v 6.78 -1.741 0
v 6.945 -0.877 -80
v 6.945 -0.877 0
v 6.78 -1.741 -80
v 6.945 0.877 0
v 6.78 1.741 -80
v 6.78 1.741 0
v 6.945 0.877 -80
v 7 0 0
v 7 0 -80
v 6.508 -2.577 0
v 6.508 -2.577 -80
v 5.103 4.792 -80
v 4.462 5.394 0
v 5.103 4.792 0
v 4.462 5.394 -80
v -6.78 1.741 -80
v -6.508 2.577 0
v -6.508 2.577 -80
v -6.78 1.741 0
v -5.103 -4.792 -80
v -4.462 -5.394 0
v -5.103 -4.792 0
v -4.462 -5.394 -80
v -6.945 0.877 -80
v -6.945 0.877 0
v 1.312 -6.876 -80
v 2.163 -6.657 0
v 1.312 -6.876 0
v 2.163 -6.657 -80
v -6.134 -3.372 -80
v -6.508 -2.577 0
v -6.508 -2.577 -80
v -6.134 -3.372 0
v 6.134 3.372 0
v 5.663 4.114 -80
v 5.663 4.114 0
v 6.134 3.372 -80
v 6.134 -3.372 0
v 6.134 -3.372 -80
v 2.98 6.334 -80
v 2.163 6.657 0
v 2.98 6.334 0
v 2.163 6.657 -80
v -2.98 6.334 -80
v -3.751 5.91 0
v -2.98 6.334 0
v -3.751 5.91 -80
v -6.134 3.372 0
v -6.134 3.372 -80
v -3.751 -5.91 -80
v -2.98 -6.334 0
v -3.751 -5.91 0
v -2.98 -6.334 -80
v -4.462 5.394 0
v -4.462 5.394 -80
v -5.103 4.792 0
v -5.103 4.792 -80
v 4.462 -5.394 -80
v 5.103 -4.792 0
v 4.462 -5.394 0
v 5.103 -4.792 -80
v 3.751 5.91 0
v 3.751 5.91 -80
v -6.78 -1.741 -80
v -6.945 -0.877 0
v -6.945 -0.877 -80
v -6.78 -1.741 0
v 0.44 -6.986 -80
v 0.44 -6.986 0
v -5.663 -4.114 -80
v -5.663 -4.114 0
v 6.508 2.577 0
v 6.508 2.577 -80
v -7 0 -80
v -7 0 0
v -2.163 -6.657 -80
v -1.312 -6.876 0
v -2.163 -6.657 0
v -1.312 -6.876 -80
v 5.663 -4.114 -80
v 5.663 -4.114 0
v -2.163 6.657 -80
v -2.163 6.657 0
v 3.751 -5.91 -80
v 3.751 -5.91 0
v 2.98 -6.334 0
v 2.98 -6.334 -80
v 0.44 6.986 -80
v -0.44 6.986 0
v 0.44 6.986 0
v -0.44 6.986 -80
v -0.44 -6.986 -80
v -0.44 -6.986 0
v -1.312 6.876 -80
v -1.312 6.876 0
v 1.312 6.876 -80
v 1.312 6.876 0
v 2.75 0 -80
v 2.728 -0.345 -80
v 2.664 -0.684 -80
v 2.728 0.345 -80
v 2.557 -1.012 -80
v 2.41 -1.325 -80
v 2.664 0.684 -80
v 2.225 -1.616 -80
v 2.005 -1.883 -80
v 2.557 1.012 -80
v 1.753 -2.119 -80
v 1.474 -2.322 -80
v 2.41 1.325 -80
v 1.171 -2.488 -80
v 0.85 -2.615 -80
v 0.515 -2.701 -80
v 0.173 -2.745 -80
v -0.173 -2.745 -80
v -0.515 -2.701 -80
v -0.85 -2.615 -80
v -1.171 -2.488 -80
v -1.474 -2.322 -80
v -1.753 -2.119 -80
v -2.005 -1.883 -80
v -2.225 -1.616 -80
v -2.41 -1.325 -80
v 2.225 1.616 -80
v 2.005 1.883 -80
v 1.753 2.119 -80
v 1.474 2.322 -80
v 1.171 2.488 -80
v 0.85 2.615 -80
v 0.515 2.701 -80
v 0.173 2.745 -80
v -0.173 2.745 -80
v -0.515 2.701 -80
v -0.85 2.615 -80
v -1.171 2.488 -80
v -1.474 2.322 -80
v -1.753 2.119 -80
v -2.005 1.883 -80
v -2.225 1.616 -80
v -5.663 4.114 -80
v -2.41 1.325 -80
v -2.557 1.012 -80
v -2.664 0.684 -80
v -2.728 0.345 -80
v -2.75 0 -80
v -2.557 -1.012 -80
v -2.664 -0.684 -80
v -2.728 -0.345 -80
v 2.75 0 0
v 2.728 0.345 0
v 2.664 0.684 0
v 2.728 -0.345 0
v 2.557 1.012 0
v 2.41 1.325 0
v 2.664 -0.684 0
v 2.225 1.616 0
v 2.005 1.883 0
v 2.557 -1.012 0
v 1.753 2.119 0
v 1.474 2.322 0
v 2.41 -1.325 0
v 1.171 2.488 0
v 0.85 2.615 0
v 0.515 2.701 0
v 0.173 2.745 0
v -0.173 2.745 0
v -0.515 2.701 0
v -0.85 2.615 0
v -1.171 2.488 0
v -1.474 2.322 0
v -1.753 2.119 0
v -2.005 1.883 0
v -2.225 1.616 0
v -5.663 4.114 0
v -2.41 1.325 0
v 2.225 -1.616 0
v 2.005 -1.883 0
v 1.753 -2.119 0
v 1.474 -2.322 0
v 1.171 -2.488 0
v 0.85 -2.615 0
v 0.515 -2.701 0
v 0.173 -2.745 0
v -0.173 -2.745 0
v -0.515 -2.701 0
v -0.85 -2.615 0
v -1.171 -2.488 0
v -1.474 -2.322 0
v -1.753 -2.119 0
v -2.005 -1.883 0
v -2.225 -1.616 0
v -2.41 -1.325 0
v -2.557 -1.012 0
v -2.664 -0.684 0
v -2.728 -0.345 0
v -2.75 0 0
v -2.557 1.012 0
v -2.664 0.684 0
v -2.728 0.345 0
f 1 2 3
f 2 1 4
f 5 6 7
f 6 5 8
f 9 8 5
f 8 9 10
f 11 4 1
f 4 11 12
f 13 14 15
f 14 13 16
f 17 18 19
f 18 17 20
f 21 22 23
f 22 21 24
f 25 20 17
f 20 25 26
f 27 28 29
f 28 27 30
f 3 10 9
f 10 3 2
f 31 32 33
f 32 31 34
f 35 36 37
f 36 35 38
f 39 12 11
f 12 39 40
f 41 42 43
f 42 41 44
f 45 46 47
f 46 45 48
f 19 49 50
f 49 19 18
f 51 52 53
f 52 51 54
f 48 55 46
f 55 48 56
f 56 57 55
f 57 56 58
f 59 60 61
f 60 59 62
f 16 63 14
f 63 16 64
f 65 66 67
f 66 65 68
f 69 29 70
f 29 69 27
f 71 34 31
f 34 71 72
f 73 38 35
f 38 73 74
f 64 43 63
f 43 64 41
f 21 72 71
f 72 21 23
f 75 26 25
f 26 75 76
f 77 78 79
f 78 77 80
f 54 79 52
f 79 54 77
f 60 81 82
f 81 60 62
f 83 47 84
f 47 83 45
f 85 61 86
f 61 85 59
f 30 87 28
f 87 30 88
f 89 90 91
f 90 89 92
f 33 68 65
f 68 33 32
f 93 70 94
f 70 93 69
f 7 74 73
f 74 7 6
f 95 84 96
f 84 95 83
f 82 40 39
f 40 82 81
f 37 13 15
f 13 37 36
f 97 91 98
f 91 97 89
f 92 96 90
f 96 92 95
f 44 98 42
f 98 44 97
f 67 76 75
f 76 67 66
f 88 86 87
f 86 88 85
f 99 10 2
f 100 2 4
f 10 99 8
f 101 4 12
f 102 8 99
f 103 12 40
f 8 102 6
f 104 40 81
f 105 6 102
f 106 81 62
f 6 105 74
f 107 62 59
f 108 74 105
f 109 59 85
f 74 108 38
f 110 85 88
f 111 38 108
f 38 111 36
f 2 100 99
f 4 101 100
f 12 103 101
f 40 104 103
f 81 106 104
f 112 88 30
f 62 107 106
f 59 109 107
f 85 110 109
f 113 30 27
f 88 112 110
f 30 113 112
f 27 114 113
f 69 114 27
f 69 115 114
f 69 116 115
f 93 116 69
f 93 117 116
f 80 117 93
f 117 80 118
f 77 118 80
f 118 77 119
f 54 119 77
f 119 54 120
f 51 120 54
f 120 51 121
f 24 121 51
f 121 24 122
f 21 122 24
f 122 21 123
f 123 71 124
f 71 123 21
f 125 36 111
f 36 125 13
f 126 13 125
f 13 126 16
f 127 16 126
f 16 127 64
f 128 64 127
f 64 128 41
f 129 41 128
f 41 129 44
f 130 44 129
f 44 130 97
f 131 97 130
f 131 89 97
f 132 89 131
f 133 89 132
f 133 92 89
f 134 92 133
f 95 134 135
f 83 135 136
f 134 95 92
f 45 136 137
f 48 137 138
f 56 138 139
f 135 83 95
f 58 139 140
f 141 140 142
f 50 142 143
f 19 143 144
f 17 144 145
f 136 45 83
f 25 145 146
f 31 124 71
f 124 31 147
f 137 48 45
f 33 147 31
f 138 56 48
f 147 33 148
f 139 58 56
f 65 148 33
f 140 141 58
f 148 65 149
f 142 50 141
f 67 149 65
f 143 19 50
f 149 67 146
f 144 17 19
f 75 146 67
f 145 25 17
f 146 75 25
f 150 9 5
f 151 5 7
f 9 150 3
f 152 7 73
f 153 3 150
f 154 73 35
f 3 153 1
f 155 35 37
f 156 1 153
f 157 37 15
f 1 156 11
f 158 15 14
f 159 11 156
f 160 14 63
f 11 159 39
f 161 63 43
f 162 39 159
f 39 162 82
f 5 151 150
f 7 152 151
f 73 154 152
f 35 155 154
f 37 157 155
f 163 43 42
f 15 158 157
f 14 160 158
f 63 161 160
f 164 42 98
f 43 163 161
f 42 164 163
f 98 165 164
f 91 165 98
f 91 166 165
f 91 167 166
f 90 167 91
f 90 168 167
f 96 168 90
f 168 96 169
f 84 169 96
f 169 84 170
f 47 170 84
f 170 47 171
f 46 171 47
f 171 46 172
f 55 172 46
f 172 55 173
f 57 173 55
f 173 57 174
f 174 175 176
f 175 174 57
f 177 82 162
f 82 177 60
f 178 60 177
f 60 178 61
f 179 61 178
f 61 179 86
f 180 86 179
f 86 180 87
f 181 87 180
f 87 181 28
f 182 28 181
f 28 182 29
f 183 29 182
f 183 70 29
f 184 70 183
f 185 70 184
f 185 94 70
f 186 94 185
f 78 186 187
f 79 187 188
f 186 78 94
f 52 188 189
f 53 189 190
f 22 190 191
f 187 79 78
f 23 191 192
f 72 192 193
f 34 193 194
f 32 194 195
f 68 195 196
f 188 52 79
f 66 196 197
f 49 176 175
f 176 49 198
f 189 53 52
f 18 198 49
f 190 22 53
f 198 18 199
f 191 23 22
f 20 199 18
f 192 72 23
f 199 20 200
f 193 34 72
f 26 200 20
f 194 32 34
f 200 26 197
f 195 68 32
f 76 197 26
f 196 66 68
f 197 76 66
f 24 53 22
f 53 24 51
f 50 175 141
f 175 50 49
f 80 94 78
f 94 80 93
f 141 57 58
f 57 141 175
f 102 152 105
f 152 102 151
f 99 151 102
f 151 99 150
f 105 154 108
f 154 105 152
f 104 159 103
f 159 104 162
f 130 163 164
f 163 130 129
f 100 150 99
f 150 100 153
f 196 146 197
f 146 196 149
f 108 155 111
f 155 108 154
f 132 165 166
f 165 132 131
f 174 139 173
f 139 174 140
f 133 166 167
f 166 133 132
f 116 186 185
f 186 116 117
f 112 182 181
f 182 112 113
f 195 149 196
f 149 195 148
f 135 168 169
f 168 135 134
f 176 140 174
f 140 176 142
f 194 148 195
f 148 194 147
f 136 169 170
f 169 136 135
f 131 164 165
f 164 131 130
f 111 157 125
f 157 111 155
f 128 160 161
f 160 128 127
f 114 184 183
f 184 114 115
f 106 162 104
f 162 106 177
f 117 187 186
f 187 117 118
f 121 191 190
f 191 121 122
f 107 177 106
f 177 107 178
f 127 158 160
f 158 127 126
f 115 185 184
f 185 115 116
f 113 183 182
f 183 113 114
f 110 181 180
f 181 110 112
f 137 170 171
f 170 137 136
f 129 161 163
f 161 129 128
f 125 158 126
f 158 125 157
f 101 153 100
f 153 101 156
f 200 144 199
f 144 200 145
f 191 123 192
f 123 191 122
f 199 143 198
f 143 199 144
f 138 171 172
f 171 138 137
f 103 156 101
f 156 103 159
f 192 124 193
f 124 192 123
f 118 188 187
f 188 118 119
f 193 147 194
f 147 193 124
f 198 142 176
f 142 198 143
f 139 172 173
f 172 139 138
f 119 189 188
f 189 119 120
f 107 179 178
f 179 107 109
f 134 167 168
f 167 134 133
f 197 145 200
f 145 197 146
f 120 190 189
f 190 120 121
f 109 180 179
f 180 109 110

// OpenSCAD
$fn = 50;


difference() {
	union() {
		translate(v = [0, 0, -80.0000000000]) {
			cylinder(h = 80, r = 7.0000000000);
		}
		cylinder(h = 0, r = 17.0000000000);
	}
	union() {
		#translate(v = [0, 0, -80]) {
			cylinder(h = 80, r = 2.7500000000);
		}
	}
}
